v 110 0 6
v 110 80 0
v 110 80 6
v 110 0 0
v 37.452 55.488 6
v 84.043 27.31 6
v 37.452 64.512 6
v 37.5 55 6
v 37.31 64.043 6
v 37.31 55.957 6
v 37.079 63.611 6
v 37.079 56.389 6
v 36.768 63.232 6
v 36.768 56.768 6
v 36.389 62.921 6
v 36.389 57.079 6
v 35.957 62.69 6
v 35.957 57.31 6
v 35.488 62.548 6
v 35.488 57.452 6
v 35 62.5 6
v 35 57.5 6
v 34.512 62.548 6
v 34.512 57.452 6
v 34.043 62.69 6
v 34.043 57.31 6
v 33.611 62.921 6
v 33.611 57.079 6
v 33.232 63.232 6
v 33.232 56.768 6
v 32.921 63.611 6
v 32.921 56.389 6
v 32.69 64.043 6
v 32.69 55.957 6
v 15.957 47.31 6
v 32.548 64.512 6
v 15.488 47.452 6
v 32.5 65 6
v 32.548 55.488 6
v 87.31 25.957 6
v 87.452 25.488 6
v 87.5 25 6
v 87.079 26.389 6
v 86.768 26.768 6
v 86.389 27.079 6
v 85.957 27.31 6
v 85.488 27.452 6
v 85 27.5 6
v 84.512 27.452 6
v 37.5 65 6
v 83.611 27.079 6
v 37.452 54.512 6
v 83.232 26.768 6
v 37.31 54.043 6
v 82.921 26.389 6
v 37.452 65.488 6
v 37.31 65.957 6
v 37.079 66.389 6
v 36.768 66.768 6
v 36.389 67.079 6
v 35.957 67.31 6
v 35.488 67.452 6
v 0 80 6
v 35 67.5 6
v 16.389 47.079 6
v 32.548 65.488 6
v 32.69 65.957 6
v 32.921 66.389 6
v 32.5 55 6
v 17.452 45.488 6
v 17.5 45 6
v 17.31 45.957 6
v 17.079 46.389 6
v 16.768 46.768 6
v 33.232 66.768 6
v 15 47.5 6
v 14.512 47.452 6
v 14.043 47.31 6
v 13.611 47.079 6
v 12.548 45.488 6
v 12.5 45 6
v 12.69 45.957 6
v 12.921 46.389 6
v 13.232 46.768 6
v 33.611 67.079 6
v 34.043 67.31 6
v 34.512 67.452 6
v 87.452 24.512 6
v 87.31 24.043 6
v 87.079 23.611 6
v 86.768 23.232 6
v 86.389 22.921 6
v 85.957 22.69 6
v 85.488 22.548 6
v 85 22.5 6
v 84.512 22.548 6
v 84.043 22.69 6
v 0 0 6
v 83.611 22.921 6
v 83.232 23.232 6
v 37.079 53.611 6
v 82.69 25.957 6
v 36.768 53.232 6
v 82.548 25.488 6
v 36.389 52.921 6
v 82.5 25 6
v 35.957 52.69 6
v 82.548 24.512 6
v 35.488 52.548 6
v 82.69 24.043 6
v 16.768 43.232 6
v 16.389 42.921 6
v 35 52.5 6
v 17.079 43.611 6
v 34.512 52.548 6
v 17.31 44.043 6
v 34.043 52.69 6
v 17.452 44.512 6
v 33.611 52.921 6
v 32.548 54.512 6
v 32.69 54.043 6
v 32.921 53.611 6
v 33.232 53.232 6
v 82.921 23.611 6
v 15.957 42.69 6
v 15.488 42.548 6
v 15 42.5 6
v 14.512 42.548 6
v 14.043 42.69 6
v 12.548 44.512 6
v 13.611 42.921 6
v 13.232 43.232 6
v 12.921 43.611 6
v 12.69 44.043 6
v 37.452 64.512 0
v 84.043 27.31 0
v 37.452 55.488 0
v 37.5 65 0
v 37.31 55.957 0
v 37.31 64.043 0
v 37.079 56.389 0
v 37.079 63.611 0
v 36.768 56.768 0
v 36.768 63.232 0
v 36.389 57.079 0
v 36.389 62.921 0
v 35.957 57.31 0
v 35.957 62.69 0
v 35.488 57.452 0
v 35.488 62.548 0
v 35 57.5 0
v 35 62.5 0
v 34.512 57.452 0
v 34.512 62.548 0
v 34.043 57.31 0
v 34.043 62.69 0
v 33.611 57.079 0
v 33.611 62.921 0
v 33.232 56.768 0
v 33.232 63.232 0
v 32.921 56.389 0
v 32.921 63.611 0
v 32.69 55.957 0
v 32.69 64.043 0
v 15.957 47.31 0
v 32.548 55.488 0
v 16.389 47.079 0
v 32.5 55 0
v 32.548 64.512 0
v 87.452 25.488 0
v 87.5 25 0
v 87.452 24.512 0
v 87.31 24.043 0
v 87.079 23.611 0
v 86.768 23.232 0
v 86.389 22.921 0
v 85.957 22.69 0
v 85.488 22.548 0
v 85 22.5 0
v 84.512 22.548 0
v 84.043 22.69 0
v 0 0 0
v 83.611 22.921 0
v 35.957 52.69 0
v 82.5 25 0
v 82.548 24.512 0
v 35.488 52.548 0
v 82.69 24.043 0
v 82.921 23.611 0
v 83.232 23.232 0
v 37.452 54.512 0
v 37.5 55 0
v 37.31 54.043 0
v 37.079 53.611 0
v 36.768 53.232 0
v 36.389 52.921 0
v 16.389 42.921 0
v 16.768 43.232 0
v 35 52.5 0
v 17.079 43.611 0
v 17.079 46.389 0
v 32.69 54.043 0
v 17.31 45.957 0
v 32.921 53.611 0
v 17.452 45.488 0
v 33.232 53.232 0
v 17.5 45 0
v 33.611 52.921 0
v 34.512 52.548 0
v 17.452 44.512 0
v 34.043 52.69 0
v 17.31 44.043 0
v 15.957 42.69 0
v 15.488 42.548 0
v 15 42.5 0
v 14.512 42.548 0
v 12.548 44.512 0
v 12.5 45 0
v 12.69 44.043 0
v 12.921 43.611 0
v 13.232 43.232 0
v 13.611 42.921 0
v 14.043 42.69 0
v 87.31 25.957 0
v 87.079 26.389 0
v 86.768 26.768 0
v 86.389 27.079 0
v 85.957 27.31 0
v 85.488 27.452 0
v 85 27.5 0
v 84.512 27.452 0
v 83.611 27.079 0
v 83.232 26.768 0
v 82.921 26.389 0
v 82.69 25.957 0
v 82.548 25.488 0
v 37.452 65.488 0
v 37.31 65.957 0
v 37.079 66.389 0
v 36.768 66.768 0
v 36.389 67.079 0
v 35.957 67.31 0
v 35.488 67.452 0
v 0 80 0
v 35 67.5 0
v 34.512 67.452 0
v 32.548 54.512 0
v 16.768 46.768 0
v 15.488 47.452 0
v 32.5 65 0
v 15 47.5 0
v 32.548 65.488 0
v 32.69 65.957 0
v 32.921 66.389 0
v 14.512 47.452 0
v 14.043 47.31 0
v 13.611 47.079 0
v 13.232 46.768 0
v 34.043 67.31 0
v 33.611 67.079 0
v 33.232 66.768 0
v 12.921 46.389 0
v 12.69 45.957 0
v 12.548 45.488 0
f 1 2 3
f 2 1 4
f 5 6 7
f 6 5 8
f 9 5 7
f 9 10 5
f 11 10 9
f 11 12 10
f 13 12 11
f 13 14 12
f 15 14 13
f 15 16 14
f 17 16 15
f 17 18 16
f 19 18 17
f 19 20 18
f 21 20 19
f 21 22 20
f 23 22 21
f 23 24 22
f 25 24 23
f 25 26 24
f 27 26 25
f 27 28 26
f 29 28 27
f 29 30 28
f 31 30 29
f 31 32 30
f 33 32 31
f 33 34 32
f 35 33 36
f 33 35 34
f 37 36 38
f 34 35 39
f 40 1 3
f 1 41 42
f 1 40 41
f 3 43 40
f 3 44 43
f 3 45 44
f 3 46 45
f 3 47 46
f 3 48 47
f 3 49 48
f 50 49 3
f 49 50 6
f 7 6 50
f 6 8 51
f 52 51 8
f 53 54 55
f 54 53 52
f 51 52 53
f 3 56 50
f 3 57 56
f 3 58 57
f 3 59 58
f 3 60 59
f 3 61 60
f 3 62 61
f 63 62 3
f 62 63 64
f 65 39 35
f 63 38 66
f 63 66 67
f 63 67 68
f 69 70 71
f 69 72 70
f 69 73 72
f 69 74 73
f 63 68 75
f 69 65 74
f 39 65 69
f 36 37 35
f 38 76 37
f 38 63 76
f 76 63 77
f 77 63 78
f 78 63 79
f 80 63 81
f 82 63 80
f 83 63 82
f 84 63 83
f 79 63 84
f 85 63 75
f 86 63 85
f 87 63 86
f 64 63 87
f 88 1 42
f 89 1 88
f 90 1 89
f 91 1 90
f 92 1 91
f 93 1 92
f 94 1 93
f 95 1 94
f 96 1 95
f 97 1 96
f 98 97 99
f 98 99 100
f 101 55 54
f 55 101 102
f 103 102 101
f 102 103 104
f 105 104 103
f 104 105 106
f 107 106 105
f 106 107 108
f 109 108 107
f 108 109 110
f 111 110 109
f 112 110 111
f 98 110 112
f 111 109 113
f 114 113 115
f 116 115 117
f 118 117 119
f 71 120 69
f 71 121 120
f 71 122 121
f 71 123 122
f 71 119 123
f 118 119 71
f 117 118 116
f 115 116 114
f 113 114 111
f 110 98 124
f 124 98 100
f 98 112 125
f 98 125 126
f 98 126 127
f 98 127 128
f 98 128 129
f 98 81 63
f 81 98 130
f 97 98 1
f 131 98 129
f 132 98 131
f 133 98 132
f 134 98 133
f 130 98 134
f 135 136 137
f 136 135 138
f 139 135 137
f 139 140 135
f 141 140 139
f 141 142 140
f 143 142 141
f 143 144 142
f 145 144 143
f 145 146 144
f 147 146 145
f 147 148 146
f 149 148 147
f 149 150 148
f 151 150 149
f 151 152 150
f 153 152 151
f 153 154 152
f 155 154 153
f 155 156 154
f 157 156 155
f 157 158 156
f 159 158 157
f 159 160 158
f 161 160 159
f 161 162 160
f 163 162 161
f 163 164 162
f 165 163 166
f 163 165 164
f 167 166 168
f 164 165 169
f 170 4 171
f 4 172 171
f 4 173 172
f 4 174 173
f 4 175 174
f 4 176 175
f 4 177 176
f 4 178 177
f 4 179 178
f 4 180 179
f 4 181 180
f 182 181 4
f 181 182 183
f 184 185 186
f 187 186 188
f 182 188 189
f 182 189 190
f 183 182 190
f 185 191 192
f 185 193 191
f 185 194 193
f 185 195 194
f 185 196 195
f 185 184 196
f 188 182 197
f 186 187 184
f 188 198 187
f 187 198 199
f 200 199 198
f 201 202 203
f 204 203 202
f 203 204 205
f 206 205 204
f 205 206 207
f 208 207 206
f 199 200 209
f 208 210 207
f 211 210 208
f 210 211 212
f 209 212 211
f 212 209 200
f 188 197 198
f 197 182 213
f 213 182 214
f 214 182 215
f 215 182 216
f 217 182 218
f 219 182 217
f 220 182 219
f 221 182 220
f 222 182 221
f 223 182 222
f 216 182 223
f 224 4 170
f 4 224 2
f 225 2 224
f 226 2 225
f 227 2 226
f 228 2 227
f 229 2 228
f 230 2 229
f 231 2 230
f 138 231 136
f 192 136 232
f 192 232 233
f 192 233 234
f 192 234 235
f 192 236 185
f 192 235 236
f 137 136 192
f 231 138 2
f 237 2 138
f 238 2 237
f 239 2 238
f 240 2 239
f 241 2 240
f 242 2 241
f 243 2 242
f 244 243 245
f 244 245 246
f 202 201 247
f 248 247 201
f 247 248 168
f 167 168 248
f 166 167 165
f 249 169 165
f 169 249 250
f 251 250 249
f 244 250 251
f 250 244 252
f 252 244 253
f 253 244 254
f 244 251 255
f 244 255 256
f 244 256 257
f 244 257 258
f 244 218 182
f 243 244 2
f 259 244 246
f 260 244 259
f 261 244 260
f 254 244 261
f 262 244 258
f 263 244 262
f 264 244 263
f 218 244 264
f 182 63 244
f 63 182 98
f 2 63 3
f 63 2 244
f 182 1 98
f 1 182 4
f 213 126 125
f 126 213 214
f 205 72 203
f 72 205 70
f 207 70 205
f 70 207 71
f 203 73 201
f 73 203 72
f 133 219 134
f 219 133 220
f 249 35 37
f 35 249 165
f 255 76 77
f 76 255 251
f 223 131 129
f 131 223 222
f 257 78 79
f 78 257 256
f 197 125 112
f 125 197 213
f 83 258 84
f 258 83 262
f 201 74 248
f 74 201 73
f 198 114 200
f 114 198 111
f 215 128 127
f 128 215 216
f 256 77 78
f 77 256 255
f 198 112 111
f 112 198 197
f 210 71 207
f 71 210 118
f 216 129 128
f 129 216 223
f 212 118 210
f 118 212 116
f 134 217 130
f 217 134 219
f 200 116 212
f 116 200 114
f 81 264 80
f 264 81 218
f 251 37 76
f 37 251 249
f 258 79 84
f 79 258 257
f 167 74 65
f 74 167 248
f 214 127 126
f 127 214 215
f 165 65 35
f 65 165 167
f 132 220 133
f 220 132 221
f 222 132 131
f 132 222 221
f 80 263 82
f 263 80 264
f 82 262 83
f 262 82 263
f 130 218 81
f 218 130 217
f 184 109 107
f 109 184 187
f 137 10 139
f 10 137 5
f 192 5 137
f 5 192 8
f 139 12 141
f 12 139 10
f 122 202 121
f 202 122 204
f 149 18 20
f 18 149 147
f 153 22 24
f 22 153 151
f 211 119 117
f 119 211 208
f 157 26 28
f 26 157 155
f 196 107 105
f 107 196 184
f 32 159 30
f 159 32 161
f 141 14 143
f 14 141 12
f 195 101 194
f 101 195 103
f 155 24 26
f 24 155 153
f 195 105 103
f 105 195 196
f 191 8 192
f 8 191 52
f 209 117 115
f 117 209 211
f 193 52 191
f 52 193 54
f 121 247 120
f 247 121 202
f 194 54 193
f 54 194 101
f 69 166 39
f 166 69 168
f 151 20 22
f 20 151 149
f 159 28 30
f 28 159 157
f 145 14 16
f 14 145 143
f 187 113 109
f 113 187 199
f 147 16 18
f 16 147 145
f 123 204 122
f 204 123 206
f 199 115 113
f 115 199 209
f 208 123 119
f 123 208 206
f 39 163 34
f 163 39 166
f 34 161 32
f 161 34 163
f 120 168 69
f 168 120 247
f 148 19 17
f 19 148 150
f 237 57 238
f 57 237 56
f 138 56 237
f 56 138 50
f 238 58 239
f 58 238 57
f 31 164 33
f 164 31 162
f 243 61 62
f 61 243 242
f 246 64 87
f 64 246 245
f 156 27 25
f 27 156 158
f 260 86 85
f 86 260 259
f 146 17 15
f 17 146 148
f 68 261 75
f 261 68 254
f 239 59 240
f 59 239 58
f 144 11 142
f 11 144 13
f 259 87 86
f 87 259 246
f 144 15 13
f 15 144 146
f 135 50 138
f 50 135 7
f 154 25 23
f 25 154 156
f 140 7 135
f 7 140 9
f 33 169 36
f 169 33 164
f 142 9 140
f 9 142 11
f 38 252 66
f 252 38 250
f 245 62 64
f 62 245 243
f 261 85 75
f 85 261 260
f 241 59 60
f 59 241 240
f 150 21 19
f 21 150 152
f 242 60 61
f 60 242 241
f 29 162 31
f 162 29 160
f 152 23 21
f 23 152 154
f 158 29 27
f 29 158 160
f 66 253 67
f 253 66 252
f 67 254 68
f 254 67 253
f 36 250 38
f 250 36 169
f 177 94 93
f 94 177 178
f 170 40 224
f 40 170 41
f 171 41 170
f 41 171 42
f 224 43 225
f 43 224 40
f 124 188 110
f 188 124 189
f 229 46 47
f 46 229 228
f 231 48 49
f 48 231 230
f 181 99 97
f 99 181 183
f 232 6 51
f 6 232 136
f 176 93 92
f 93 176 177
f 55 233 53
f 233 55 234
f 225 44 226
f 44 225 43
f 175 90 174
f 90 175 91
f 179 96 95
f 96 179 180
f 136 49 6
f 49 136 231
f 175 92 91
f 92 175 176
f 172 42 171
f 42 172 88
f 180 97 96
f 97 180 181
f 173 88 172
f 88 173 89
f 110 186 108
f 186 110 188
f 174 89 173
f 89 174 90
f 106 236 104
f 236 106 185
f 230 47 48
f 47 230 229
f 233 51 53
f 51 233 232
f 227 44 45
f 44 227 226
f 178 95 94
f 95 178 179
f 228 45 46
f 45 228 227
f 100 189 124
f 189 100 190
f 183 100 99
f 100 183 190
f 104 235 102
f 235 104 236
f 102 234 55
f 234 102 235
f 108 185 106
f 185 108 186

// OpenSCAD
$fn = 32;

// ----------------------------------------------------------------------
// Hole field: plate with holes at given coordinates
// ----------------------------------------------------------------------

// --- parameters (mm) ---
plate_l = 110;            // plate length, X
plate_w = 80;             // plate width, Y
plate_t = 6;              // plate thickness, Z
hole_d = 5;               // hole diameter

difference() {
  cube([plate_l, plate_w, plate_t]);
  translate([15, 45, -1]) cylinder(h = plate_t + 2, d = hole_d);
  translate([35, 55, -1]) cylinder(h = plate_t + 2, d = hole_d);
  translate([35, 65, -1]) cylinder(h = plate_t + 2, d = hole_d);
  translate([85, 25, -1]) cylinder(h = plate_t + 2, d = hole_d);
}
